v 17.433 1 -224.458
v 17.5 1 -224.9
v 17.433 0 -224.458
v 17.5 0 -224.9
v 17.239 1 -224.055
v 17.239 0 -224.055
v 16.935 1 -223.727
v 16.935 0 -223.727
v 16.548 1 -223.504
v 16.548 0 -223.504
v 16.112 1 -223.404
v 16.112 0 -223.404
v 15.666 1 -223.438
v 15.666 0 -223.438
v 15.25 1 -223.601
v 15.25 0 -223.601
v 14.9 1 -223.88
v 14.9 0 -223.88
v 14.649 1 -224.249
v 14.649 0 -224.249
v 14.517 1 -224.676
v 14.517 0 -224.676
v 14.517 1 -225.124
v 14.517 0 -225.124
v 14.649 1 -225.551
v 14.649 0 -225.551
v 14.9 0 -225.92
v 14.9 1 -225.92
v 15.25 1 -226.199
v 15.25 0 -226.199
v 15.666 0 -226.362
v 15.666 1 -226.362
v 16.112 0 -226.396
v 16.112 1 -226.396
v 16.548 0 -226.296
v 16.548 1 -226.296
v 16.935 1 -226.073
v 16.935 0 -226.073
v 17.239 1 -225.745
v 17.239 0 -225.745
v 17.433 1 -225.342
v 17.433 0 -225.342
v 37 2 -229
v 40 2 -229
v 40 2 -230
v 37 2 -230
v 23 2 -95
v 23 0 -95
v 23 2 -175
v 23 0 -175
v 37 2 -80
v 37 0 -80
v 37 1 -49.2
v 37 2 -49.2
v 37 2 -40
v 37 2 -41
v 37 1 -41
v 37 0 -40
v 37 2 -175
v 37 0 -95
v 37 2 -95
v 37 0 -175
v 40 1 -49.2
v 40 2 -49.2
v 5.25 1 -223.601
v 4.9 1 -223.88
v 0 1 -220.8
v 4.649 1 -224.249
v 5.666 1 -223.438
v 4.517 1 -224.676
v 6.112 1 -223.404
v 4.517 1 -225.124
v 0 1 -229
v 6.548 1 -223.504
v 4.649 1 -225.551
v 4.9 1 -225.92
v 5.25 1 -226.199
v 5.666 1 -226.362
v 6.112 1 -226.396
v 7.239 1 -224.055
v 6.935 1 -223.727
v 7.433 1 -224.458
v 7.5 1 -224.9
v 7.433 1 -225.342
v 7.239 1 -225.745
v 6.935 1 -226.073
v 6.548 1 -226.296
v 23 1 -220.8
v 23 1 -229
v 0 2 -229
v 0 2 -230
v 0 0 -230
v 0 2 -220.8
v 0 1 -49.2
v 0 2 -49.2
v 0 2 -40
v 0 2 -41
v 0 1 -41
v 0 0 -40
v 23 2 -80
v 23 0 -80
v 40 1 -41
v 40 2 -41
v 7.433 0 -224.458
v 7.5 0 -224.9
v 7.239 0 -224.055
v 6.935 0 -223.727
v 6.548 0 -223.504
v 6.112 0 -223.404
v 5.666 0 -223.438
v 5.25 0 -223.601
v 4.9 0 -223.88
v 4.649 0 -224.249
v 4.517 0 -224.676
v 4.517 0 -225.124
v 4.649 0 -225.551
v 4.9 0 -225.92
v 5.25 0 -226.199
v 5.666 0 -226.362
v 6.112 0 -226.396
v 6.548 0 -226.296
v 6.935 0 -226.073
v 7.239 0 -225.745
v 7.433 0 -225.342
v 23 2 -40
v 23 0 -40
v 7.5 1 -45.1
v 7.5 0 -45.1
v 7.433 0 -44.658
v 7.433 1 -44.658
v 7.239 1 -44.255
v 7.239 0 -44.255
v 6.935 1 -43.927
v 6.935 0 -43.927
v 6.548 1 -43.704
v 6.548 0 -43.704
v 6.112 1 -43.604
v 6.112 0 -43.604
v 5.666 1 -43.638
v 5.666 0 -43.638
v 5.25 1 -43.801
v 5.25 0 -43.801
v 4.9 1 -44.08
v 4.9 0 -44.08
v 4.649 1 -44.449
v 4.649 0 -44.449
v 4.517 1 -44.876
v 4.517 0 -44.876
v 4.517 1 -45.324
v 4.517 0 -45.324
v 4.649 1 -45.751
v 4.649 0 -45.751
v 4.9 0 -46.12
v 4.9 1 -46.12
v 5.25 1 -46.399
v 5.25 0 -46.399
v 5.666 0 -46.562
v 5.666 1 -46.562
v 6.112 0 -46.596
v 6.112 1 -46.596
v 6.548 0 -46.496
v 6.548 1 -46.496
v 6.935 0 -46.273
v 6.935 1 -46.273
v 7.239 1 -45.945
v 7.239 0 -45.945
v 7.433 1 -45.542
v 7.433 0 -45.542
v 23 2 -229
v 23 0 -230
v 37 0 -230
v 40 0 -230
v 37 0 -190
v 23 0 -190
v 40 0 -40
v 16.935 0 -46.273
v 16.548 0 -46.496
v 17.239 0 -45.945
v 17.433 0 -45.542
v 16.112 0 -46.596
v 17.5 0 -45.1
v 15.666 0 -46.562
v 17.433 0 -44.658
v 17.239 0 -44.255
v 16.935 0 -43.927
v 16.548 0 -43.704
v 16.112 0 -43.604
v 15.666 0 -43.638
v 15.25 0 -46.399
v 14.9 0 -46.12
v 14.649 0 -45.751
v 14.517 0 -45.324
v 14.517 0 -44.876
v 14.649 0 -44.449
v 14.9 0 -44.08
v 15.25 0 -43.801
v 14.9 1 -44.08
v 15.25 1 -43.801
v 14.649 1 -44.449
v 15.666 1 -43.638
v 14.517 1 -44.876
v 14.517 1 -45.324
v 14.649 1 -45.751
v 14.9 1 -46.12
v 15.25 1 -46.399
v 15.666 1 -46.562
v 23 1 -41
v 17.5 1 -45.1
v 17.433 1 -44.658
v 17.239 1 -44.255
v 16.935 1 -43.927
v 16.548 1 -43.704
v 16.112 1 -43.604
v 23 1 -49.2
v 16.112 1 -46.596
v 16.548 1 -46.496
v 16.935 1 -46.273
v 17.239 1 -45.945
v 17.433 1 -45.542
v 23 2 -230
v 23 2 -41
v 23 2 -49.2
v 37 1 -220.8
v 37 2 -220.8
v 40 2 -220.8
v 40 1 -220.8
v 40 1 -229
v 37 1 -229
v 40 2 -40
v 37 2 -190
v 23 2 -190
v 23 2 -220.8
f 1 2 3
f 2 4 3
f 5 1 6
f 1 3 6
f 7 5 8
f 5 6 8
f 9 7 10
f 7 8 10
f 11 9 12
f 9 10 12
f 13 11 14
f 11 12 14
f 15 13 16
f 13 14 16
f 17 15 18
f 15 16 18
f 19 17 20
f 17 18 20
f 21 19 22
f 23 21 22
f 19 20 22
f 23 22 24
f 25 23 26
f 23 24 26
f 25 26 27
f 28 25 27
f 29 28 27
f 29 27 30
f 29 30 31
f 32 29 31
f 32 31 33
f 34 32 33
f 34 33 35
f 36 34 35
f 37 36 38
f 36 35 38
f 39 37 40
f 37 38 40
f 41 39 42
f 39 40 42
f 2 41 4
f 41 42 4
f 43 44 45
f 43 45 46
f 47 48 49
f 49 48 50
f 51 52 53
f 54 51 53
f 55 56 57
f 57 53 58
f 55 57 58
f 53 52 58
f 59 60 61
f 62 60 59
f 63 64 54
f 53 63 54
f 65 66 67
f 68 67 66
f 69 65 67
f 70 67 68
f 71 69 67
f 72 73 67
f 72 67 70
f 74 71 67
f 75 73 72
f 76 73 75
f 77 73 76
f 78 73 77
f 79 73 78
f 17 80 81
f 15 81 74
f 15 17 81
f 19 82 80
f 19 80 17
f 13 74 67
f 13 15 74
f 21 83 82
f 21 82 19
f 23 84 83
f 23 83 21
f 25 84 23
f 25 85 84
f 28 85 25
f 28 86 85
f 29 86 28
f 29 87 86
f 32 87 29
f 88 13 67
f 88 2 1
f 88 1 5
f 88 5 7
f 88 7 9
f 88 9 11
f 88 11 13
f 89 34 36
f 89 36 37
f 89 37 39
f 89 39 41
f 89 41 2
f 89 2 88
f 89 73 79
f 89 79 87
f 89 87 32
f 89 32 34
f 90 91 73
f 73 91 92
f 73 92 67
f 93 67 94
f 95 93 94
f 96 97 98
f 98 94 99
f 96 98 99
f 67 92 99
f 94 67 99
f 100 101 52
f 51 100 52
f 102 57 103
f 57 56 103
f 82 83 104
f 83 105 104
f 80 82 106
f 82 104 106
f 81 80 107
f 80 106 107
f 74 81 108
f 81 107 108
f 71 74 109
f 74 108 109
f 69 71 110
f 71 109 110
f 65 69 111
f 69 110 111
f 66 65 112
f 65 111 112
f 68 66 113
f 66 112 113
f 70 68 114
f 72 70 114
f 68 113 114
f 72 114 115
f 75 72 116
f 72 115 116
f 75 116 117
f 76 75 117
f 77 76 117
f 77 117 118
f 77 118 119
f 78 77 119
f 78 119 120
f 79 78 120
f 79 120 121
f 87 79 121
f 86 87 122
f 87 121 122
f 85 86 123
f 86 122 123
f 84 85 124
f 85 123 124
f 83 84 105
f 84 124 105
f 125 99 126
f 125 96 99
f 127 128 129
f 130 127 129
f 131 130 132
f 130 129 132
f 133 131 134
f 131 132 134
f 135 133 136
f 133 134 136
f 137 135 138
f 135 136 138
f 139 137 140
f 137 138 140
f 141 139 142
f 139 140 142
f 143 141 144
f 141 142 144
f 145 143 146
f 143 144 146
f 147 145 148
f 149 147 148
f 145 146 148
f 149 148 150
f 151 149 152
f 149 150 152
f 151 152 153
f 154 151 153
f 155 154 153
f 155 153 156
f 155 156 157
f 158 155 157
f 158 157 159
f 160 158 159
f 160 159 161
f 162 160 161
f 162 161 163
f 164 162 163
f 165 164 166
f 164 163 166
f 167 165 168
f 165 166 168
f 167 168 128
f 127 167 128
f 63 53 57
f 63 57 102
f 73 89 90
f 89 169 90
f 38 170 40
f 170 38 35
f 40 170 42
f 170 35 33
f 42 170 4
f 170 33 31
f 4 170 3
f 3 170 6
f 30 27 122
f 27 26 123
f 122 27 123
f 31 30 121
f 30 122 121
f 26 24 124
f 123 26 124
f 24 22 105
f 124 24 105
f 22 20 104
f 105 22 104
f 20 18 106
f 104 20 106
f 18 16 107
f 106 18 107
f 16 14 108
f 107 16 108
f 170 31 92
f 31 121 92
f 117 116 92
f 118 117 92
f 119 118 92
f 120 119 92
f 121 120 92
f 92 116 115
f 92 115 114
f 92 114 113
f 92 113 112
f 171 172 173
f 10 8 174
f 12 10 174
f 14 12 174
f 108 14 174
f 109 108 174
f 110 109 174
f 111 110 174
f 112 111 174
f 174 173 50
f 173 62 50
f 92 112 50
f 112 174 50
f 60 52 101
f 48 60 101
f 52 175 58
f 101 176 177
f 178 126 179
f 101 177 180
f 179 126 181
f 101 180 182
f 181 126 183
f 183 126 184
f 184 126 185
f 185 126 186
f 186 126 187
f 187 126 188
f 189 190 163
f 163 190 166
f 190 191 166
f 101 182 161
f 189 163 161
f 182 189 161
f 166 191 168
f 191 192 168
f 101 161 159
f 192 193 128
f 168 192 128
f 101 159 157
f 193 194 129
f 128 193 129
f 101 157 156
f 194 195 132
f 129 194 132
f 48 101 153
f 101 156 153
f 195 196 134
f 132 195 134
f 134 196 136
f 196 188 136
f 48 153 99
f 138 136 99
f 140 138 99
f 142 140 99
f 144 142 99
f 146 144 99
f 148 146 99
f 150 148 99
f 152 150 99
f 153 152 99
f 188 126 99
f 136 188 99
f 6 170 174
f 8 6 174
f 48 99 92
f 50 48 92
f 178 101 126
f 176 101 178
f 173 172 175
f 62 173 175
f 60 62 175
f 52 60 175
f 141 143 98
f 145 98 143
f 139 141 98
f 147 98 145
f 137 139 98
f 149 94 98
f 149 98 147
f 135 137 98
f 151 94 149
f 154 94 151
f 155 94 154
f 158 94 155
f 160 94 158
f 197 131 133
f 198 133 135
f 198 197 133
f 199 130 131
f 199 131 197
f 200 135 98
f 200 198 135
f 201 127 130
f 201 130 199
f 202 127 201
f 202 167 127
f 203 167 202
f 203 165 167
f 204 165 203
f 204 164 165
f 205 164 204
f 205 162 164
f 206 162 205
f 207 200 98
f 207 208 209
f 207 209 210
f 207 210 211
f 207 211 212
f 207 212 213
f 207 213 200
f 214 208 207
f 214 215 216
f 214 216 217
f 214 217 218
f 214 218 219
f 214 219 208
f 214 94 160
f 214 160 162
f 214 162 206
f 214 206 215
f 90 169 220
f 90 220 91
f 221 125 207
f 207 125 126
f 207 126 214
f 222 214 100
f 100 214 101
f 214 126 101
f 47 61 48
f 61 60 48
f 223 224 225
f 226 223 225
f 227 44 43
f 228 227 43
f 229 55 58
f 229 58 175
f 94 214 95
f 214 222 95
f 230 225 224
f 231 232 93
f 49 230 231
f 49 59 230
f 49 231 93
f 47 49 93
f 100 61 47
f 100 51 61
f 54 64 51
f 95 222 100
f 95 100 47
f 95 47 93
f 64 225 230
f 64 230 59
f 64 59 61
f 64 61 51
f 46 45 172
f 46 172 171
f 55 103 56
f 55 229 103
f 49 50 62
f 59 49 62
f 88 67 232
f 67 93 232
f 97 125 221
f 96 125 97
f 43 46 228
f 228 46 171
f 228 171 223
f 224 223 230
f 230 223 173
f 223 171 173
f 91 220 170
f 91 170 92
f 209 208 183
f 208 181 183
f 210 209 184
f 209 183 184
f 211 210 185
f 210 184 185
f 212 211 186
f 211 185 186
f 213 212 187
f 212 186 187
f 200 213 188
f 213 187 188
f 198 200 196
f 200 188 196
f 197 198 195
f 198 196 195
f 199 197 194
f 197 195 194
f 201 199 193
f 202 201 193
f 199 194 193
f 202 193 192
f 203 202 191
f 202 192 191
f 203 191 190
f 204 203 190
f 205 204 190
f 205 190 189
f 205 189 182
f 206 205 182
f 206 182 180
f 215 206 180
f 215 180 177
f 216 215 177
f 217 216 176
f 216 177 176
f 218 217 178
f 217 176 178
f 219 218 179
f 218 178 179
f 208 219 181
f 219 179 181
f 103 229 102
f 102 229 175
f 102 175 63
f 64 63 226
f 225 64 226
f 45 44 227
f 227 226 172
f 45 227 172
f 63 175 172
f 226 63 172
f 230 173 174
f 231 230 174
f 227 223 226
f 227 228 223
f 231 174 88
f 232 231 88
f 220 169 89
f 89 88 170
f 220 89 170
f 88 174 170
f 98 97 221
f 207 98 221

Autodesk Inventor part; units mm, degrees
ref_plane "YZ Plane" through (0, 0, 0) normal (1, 0, 0) x (0, 1, 0)
ref_plane "XZ Plane" through (0, 0, 0) normal (0, 1, 0) x (-1, 0, 0)
ref_plane "XY Plane" through (0, 0, 0) normal (0, 0, 1) x (1, 0, 0)
sketch "스케치1" plane through (0, 0, 0) normal (0, 1, 0) x (-1, 0, 0)
  line L0 (0, 0) -> (-40, 0)
  line L1 (-40, 0) -> (-40, -270)
  line L2 (-40, -270) -> (0, -270)
  line L3 (0, -270) -> (0, 0)
  dimension "d0" = 40
  dimension "d1" = 270
extrude "돌출1" add sketch "스케치1" along normal blind 2
sketch "스케치2" plane through (0, 2, 0) normal (0, 1, 0) x (1, 0, 0)
  line L0 (0, 0) -> (40, 0) projected
  line L1 (40, 0) -> (40, 270) projected
  line L2 (40, 270) -> (0, 270) projected
  line L3 (0, 270) -> (0, 0) projected
  line L4 (0, 270) -> (0, 0) projected
  line L5 (40, 229) -> (0, 229)
  line L6 (0, 229) -> (0, 220.8)
  line L7 (0, 220.8) -> (40, 220.8)
  line L8 (40, 220.8) -> (40, 229)
  line L9 (40, 0) -> (40, 270) projected
  line L10 (40, 49.2) -> (0, 49.2)
  line L11 (0, 49.2) -> (0, 41)
  line L12 (0, 41) -> (40, 41)
  line L13 (40, 41) -> (40, 49.2)
  dimension "d4" = 8.2
  dimension "d5" = 8.2
  dimension "d6" = 41
  dimension "d7" = 41
extrude "돌출2" cut sketch "스케치2" against normal blind 1 contours L3 L10 L1 L12 | L3 L5 L1 L7
sketch "스케치3" plane through (0, 0, 0) normal (0, -1, 0) x (1, 0, 0)
  line L0 (0, 0) -> (40, 0) projected
  line L1 (0, -270) -> (0, 0) projected
  line L2 (40, -270) -> (0, -270) projected
  line L3 (40, 0) -> (40, -270) projected
  line L4 (37, -260) -> (37, -190)
  line L5 (37, -190) -> (23, -190)
  line L6 (23, -190) -> (23, -260)
  line L7 (23, -80) -> (37, -80)
  line L8 (37, -80) -> (37, -10)
  line L9 (37, -10) -> (23, -10)
  line L10 (23, -10) -> (23, -80)
  line L11 (23, -260) -> (37, -260)
  dimension "d15" = 14
  dimension "d17" = 3
  dimension "d20" = 14
  dimension "d21" = 70
  dimension "d22" = 3
  dimension "d23" = 10
  dimension "d25" = 10
  dimension "d26" = 70
extrude "돌출4" cut sketch "스케치3" against normal blind 2 contours L11 L6 L5 L4 | L10 L9 L8 L7
sketch "스케치4" plane through (0, 0, 0) normal (0, -1, 0) x (1, 0, 0)
  line L0 (23, -190) -> (37, -190) projected
  line L1 (37, -190) -> (37, -260) projected
  line L2 (37, -260) -> (23, -260) projected
  line L3 (23, -260) -> (23, -190) projected
  line L4 (37, -10) -> (37, -80) projected
  line L5 (37, -80) -> (23, -80) projected
  line L6 (23, -80) -> (23, -10) projected
  line L7 (23, -10) -> (37, -10) projected
  line L8 (0, 0) -> (40, 0) projected
  line L9 (0, -270) -> (0, 0) projected
  line L10 (40, -270) -> (0, -270) projected
  line L11 (40, 0) -> (40, -270) projected
  line L12 (23, -175) -> (37, -175)
  line L13 (37, -95) -> (23, -95)
  line L14 (23, -95) -> (23, -175)
  line L15 (37, -95) -> (37, -175)
  dimension "d36" = 95
  dimension "d39" = 14
  dimension "d40" = 3
  dimension "d41" = 80
extrude "돌출6" cut sketch "스케치4" against normal blind 2 contours L14 L13 L15 L12
sketch "스케치5" plane through (0, 2, 0) normal (0, 1, 0) x (1, 0, 0)
  line L0 (40, 229) -> (40, 270) projected
  line L1 (0, 270) -> (0, 229) projected
  line L2 (40, 269) -> (0, 269)
  line L3 (0, 269) -> (0, 260.8)
  line L4 (0, 260.8) -> (40, 260.8)
  line L5 (40, 260.8) -> (40, 269)
  line L6 (40, 0) -> (40, 41) projected
  line L7 (0, 41) -> (0, 0) projected
  line L8 (40, 9.2) -> (0, 9.2)
  line L9 (0, 9.2) -> (0, 1)
  line L10 (0, 1) -> (40, 1)
  line L11 (40, 1) -> (40, 9.2)
  line L12 (0, 0) -> (40, 0) projected
  line L13 (40, 270) -> (0, 270) projected
  dimension "d44" = 8.2
  dimension "d45" = 8.2
  dimension "d46" = 1
  dimension "d47" = 1
extrude "돌출7" cut sketch "스케치5" against normal blind 1 contours L4 L1 L2 L0 | L10 L7 L8 L6
sketch "스케치6" plane through (0, 0, 0) normal (0, -1, 0) x (1, 0, 0)
  line L0 (0, -9.2) -> (40, -9.2) projected
  line L1 (40, -9.2) -> (40, -41) projected
  line L2 (40, -41) -> (37, -41) projected
  line L3 (37, -41) -> (37, -10) projected
  line L4 (37, -10) -> (23, -10) projected
  line L5 (23, -10) -> (23, -41) projected
  line L6 (23, -41) -> (0, -41) projected
  line L7 (0, -41) -> (0, -9.2) projected
  line L8 (37, -95) -> (23, -95) projected
  line L9 (23, -190) -> (23, -220.8) projected
  line L10 (23, -220.8) -> (0, -220.8) projected
  line L11 (0, -220.8) -> (0, -49.2) projected
  line L12 (0, -49.2) -> (23, -49.2) projected
  line L13 (23, -49.2) -> (23, -80) projected
  line L14 (23, -80) -> (37, -80) projected
  line L15 (37, -80) -> (37, -49.2) projected
  line L16 (37, -49.2) -> (40, -49.2) projected
  line L17 (40, -49.2) -> (40, -220.8) projected
  line L18 (40, -220.8) -> (37, -220.8) projected
  line L19 (37, -220.8) -> (37, -190) projected
  line L20 (40, -260.8) -> (0, -260.8) projected
  line L21 (0, -260.8) -> (0, -229) projected
  line L22 (0, -229) -> (23, -229) projected
  line L23 (23, -229) -> (23, -260) projected
  line L24 (23, -260) -> (37, -260) projected
  line L25 (37, -260) -> (37, -229) projected
  line L26 (37, -229) -> (40, -229) projected
  line L27 (40, -229) -> (40, -260.8) projected
  line L28 (0, -269) -> (40, -269) projected
  line L29 (40, -269) -> (40, -270) projected
  line L30 (40, -270) -> (0, -270) projected
  line L31 (0, -270) -> (0, -269) projected
  line L32 (40, -1) -> (0, -1) projected
  line L33 (0, -1) -> (0, 0) projected
  line L34 (0, 0) -> (40, 0) projected
  line L35 (40, 0) -> (40, -1) projected
  circle A0 centre (6, -5.1) radius 1.5
  circle A1 centre (16, -5.1) radius 1.5
  circle A2 centre (6, -45.1) radius 1.5
  circle A3 centre (16, -45.1) radius 1.5
  circle A4 centre (6, -224.9) radius 1.5
  circle A5 centre (16, -224.9) radius 1.5
  circle A6 centre (6, -264.9) radius 1.5
  circle A7 centre (16, -264.9) radius 1.5
  line L36 (0, -270) -> (0, 0) projected
  line L37 (37, -175) -> (37, -95) projected
  line L38 (23, -95) -> (23, -175) projected
  line L39 (23, -175) -> (37, -175) projected
  line L40 (37, -190) -> (23, -190) projected
  dimension "d50" = 3
  dimension "d51" = 3
  dimension "d52" = 3
  dimension "d53" = 3
  dimension "d54" = 3
  dimension "d55" = 3
  dimension "d56" = 3
  dimension "d57" = 3
  dimension "d58" = 4.1
  dimension "d59" = 6
  dimension "d60" = 4.1
  dimension "d61" = 10
  dimension "d62" = 4.1
  dimension "d63" = 4.1
  dimension "d64" = 6
  dimension "d65" = 10
  dimension "d66" = 4.1
  dimension "d67" = 4.1
  dimension "d68" = 6
  dimension "d69" = 10
  dimension "d70" = 4.1
  dimension "d71" = 4.1
  dimension "d72" = 6
  dimension "d73" = 10
extrude "돌출8" cut sketch "스케치6" against normal blind 3 contours A0 | A1 | A2 | A3 | A4 | A5 | A6 | A7
sketch "스케치8" plane through (0, 2, 0) normal (0, 1, 0) x (1, 0, 0)
  line L0 (39, 40) -> (38, 40)
  line L1 (22, 40) -> (0, 40)
  line L2 (39, 230) -> (38, 230)
  line L3 (22, 230) -> (0, 230)
  line L4 (0, 40) -> (40, 40)
  line L5 (40, 40) -> (40, 0)
  line L6 (40, 0) -> (0, 0)
  line L7 (0, 0) -> (0, 40)
  line L8 (40, 270) -> (0, 270) projected
  line L9 (0, 230) -> (40, 230)
  line L10 (40, 230) -> (40, 270)
  line L11 (40, 270) -> (0, 270)
  line L12 (0, 270) -> (0, 230)
extrude "돌출10" cut sketch "스케치8" against normal blind 2
properties part number "앞뒷판_위_수정" material "알루미늄 6061"
